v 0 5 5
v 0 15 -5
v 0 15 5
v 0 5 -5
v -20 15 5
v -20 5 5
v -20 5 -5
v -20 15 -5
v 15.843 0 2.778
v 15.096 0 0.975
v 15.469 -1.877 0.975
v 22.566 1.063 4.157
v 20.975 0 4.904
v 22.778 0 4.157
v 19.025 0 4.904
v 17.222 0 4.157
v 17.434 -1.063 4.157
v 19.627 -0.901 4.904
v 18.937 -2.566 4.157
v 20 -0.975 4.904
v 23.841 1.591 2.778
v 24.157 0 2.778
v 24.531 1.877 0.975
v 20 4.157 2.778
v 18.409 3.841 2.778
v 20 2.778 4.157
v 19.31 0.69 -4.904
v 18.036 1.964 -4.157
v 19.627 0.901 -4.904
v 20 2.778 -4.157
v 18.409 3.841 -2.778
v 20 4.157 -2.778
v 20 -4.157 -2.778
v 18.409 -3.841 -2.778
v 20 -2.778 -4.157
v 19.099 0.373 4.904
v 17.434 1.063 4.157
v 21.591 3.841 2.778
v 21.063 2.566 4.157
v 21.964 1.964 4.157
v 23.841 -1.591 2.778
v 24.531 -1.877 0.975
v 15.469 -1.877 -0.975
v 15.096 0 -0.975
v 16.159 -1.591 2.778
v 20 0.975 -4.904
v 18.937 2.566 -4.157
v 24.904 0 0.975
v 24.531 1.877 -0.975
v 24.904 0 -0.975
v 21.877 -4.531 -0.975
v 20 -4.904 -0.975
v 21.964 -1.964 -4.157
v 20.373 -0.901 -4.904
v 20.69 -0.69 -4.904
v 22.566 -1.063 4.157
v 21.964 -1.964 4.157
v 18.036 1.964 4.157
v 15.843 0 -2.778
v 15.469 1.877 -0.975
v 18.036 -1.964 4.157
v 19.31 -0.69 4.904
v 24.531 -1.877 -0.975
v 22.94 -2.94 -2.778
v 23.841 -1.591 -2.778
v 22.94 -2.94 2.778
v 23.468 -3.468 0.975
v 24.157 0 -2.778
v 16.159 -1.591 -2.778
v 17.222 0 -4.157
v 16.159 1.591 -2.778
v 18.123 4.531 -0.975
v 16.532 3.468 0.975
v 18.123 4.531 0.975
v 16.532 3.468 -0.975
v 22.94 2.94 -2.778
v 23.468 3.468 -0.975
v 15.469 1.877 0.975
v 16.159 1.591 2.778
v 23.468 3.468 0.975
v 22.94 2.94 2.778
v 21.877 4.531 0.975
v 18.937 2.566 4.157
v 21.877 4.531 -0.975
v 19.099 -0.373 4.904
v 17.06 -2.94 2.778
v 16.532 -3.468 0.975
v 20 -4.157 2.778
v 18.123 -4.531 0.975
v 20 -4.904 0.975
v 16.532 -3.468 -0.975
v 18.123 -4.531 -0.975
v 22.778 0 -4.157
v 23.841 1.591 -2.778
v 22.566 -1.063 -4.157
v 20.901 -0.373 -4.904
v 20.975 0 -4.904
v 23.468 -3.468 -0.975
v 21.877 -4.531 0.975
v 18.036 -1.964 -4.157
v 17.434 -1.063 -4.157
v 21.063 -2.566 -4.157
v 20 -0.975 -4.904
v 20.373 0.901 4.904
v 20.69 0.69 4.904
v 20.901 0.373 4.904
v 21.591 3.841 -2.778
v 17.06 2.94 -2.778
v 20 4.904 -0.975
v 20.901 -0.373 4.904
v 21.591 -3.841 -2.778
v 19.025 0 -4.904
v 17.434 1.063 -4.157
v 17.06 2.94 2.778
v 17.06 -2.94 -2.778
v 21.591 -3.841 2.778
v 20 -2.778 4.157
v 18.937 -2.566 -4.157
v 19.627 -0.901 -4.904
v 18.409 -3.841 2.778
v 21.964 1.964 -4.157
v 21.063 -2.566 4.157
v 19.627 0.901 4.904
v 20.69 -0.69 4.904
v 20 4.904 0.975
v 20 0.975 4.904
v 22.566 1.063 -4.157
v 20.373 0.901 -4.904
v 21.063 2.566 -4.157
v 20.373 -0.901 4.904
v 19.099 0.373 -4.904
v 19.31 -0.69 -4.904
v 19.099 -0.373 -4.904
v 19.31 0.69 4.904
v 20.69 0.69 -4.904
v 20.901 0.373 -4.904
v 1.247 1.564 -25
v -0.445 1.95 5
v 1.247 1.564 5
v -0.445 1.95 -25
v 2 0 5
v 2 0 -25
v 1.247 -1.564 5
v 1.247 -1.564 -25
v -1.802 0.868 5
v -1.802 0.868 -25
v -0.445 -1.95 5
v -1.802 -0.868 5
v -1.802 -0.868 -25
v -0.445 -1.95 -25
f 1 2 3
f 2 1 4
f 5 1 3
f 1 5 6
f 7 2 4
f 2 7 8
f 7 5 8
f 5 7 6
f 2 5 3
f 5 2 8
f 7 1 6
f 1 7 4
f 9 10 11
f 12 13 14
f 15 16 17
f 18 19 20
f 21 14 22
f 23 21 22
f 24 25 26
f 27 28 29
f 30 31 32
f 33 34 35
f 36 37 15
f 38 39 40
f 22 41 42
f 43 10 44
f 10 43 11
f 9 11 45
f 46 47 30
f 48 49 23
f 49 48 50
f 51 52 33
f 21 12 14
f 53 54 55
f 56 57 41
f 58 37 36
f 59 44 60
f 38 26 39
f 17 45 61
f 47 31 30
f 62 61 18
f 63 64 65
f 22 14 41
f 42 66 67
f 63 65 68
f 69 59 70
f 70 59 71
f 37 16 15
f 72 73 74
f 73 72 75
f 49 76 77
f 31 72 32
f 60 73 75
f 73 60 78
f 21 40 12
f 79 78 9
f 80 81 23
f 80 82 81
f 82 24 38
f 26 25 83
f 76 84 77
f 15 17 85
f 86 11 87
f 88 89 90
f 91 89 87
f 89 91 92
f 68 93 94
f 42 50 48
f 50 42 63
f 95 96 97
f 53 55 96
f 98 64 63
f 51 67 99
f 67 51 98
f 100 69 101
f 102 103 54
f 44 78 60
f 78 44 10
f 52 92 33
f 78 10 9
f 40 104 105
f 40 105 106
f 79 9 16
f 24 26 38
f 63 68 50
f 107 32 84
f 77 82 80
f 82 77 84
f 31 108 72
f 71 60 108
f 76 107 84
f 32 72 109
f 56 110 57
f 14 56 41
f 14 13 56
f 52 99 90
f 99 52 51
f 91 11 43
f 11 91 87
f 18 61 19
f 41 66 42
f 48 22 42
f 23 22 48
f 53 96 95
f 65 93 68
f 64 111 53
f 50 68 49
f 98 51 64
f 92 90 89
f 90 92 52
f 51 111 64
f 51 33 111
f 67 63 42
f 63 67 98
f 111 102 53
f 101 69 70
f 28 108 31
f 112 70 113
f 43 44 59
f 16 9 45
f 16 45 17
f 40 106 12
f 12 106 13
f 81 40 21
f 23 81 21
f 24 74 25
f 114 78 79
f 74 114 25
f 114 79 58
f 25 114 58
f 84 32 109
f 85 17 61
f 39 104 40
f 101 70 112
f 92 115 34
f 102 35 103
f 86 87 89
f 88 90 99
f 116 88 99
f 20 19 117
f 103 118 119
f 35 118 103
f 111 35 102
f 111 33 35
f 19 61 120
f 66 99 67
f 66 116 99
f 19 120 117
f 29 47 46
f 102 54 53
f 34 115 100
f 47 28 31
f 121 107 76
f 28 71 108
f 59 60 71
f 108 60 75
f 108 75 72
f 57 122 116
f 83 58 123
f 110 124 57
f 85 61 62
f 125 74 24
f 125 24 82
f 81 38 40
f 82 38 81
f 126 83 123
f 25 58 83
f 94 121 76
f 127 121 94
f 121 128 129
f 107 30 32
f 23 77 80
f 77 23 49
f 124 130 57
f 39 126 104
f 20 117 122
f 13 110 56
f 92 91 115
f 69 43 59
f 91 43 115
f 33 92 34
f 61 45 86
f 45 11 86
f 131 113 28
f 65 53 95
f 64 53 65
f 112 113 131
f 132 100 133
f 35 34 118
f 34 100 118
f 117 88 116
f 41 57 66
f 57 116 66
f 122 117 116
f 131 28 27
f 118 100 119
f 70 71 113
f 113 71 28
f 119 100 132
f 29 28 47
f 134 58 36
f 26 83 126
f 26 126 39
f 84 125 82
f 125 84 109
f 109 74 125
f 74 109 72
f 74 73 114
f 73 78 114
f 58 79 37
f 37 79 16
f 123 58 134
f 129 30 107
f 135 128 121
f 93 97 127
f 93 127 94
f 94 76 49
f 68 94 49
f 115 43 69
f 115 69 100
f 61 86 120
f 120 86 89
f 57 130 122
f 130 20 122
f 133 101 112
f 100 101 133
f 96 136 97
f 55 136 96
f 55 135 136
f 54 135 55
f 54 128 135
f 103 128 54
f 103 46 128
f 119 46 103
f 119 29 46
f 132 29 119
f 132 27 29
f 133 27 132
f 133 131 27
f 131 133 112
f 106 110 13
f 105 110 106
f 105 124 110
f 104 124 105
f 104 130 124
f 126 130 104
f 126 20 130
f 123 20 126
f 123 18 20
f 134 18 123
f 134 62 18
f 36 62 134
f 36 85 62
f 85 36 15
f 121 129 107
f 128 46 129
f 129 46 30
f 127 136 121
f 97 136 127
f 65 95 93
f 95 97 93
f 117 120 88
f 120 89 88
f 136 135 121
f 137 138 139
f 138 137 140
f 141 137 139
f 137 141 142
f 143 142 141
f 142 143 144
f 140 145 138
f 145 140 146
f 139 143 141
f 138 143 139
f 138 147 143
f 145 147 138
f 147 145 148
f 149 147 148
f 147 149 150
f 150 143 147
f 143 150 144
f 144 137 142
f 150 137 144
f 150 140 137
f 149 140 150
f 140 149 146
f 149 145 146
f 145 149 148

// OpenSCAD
translate([-10, 10, 0])
	cube([20, 10, 10], center=true);
translate([20, 0, 0])
	sphere(5);
translate([0, 0, -10])
	cylinder(h=30, r=2, center=true);
